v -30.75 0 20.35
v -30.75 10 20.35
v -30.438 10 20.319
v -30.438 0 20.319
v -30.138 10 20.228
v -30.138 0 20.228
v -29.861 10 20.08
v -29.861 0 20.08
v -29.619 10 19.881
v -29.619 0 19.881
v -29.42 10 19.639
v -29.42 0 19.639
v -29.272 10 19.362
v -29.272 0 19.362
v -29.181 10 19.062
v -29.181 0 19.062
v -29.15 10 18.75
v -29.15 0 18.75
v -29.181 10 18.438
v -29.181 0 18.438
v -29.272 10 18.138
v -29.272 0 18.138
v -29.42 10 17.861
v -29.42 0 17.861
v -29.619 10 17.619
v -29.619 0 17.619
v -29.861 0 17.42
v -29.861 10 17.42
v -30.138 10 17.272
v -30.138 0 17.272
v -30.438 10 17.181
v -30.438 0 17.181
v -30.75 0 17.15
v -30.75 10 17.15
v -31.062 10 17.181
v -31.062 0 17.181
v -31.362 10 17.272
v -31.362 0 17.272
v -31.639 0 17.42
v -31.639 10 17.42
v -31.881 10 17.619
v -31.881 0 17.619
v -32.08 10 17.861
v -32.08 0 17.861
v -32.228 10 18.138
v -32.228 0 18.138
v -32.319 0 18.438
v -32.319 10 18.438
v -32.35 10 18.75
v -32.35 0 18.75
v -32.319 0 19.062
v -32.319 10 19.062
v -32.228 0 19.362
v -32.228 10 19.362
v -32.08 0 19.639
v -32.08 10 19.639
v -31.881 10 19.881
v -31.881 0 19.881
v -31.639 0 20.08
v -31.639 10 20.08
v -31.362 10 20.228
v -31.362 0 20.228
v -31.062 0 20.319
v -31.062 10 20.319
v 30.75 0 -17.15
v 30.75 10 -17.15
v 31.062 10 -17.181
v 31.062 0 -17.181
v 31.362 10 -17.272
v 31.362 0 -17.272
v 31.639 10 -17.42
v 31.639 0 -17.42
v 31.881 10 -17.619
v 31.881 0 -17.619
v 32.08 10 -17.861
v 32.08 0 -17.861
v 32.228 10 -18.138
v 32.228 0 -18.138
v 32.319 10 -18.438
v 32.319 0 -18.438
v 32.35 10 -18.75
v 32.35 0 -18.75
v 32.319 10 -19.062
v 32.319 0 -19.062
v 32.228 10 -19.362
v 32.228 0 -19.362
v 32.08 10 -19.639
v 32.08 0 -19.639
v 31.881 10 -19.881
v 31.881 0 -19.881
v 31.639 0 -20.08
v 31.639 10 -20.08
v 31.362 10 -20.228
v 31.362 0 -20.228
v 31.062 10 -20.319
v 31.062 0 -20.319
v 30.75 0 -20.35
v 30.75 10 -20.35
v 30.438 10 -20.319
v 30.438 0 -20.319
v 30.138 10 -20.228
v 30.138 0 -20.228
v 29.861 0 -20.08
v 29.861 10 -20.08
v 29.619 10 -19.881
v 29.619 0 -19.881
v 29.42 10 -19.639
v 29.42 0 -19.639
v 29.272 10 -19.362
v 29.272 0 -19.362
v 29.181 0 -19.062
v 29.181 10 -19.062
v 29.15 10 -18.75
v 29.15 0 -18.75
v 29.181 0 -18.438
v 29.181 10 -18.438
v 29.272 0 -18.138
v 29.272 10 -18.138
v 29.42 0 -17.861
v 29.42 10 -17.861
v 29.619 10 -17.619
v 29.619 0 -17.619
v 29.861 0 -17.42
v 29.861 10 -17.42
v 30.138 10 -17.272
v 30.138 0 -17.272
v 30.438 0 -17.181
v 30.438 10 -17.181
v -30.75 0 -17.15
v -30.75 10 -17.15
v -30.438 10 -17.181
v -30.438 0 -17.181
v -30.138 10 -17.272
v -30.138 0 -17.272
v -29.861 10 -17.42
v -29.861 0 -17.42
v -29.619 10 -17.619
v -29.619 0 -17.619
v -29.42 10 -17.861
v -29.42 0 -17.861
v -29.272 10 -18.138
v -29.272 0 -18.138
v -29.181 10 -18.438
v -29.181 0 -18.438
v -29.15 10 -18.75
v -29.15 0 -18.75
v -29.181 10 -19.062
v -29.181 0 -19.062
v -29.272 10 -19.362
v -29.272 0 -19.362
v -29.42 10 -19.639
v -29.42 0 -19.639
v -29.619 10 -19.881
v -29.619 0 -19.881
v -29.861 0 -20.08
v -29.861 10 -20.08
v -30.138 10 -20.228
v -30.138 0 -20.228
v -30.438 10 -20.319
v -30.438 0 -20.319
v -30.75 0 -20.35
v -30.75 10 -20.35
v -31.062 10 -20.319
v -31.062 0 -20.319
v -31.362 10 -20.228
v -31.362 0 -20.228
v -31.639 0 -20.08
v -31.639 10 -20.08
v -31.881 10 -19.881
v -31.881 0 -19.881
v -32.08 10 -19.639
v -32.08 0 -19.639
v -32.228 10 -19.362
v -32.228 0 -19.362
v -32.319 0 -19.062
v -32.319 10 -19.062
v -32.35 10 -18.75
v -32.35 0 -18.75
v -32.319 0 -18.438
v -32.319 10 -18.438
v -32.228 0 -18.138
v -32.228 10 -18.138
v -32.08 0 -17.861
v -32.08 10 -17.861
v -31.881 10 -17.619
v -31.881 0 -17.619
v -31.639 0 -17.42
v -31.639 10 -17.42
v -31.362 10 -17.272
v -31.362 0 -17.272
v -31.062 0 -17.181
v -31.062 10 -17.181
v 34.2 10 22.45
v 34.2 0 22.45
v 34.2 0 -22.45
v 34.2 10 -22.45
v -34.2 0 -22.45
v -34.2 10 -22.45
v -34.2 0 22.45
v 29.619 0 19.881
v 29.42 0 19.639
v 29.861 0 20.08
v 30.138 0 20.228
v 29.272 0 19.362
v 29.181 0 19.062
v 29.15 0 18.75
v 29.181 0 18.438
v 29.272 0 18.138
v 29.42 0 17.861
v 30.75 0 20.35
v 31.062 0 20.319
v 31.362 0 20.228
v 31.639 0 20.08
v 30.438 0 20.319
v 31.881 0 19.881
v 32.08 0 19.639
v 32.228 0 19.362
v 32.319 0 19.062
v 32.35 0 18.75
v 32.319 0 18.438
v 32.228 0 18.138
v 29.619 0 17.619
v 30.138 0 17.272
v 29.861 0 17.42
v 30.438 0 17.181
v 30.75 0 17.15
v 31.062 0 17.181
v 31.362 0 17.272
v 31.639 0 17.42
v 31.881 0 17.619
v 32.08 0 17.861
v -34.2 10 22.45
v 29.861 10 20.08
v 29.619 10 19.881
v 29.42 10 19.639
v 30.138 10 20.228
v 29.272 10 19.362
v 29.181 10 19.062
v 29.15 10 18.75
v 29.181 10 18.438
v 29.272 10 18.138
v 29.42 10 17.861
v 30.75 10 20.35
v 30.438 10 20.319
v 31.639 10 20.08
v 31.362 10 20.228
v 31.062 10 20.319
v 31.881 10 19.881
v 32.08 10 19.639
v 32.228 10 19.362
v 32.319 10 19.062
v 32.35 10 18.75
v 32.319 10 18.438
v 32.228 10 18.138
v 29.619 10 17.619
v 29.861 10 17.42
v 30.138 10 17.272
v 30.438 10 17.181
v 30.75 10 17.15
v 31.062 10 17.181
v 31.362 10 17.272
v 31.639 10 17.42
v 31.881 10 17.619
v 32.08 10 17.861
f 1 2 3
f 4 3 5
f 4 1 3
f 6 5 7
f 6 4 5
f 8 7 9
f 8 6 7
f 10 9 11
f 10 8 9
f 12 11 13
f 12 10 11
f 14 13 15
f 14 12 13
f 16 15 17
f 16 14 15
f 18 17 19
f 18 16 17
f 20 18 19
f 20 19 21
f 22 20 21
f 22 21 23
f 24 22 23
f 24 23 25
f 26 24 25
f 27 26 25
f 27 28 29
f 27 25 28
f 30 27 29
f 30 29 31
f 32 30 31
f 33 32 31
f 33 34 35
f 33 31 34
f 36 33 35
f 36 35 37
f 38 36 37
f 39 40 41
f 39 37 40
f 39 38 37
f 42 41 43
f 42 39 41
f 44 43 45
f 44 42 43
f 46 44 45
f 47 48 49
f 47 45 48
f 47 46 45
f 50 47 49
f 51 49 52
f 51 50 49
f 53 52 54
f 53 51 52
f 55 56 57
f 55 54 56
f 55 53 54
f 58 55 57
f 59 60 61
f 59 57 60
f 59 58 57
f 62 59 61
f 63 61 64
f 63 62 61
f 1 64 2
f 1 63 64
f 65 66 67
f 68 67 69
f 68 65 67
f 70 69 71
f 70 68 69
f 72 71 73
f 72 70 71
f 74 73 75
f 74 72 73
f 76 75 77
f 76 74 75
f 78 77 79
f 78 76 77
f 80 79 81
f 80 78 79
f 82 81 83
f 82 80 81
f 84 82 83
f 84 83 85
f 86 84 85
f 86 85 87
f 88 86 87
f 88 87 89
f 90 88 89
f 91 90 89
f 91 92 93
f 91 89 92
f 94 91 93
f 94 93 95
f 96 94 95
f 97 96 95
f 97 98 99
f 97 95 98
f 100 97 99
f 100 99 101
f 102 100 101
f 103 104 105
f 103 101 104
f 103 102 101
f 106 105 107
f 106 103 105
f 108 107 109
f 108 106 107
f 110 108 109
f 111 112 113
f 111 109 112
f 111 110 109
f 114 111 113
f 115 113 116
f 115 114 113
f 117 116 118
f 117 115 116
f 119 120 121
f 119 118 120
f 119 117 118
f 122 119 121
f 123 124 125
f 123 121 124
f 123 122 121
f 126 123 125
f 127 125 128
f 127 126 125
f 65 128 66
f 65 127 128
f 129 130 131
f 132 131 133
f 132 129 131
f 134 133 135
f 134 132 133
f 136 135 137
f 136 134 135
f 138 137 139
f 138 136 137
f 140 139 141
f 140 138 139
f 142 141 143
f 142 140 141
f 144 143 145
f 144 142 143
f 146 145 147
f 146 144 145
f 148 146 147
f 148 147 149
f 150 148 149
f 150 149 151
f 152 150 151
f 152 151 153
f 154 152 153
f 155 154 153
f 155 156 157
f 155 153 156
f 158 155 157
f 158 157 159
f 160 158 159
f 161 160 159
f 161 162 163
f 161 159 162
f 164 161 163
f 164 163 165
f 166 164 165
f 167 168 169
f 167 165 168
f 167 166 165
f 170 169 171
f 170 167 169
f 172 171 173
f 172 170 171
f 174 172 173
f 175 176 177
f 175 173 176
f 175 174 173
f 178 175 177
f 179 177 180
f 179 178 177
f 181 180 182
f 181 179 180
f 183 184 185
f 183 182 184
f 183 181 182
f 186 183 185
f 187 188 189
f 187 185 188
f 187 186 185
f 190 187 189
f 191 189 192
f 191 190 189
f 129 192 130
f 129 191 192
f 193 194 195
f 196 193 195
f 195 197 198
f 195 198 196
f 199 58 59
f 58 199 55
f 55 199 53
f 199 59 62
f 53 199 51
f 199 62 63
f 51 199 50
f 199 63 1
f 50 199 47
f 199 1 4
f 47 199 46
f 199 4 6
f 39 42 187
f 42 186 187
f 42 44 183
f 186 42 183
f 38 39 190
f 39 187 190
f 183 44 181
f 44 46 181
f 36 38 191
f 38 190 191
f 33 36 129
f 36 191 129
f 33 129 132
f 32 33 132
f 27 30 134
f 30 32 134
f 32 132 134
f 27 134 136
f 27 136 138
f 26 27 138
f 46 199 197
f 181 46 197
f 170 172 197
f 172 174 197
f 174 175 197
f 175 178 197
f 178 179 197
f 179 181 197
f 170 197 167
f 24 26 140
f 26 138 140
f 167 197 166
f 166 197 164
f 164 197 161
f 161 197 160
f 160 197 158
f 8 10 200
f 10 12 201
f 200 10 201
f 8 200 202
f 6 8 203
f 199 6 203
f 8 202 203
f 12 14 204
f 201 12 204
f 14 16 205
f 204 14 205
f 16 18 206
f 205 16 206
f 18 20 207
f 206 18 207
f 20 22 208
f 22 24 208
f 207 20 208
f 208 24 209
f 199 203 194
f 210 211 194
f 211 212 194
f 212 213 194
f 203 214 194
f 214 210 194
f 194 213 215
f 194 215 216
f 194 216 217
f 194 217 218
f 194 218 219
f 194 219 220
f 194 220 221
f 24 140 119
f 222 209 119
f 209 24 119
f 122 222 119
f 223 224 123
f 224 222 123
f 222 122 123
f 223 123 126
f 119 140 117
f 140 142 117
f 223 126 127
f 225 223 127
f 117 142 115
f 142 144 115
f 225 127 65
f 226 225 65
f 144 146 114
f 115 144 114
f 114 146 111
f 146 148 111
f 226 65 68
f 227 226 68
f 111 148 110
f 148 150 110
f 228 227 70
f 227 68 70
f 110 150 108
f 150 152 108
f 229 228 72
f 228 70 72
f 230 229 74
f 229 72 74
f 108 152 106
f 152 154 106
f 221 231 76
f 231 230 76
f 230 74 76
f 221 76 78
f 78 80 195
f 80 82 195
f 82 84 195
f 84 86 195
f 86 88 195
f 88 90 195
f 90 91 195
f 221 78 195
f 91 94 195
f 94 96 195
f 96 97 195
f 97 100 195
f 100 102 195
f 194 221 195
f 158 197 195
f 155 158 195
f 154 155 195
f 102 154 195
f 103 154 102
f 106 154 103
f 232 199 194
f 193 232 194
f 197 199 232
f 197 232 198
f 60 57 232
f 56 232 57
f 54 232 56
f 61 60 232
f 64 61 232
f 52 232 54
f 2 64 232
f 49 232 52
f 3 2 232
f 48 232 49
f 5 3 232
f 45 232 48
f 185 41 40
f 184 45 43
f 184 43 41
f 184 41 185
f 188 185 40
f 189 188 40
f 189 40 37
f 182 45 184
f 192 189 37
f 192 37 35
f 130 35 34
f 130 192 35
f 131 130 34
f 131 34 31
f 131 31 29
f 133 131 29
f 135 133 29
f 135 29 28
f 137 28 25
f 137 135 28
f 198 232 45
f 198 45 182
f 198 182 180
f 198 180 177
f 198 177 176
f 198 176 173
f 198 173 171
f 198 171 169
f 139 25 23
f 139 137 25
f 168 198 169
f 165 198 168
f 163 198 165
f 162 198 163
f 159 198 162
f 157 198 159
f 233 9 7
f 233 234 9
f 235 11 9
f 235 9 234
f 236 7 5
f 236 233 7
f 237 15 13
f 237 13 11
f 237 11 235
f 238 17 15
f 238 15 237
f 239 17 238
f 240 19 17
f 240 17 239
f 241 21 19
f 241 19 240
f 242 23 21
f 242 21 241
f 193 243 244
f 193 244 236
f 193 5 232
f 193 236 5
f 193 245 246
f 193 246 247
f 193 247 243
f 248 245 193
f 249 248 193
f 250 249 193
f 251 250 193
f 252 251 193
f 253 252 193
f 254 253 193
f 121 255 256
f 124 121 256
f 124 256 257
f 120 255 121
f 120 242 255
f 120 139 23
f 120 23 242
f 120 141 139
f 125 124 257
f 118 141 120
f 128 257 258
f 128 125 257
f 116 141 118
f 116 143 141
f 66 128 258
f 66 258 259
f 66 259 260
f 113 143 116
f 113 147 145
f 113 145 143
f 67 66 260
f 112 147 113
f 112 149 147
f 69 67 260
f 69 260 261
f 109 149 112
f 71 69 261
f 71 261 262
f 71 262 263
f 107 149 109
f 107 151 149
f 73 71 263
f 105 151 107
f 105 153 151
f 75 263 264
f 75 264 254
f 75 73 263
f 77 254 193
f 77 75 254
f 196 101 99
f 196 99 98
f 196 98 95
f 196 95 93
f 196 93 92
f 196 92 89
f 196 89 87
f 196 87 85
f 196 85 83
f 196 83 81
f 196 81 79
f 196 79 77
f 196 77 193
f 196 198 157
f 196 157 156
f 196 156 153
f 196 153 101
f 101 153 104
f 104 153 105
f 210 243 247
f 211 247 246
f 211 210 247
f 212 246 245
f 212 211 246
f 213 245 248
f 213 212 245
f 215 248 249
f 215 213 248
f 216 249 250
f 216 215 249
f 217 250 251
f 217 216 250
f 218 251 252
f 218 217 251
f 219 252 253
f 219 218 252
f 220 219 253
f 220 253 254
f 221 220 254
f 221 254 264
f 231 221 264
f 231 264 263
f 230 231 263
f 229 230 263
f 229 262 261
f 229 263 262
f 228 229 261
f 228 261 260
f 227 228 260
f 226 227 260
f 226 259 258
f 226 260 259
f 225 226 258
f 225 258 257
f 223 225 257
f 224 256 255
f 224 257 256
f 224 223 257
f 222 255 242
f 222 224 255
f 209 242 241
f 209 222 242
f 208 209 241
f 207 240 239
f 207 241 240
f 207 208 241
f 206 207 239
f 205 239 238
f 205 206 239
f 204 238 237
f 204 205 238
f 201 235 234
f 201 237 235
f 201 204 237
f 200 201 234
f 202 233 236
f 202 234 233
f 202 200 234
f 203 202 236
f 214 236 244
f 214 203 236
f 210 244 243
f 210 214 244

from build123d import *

# Parameters (mm, degrees)
SKETCH1_W           = 68.4
SKETCH1_H           = 44.9
BOSS_EXTRUDE1_DEPTH = 10
CUT_EXTRUDE1_REACH  = 44.115
SKETCH2_R           = 1.6


with BuildPart() as part:
    # Sketch1 → Boss-Extrude1 (new body)
    with BuildSketch(Plane(origin=(0, 0, 0), x_dir=(1, 0, 0), z_dir=(0, 1, 0))):
        Rectangle(SKETCH1_W, SKETCH1_H)
    extrude(amount=BOSS_EXTRUDE1_DEPTH)

    # Sketch2 → Cut-Extrude1 (cut, up to next)
    with BuildSketch(Plane(origin=(0, 0, 0), x_dir=(1, 0, 0), z_dir=(0, 1, 0)), mode=Mode.PRIVATE) as cut_extrude1_sk1:
        with Locations(Location((30.75, 18.75, 0), (0, 0, 270))):
            Circle(SKETCH2_R)
    cut_extrude1_tool1 = extrude(cut_extrude1_sk1.sketch, amount=CUT_EXTRUDE1_REACH, mode=Mode.PRIVATE) & part.part
    # Sketch2 → Cut-Extrude1 (cut, up to next)
    with BuildSketch(Plane(origin=(0, 0, 0), x_dir=(1, 0, 0), z_dir=(0, 1, 0)), mode=Mode.PRIVATE) as cut_extrude1_sk2:
        with Locations(Location((30.75, -18.75, 0), (0, 0, 270))):
            Circle(SKETCH2_R)
    cut_extrude1_tool2 = extrude(cut_extrude1_sk2.sketch, amount=CUT_EXTRUDE1_REACH, mode=Mode.PRIVATE) & part.part
    # Sketch2 → Cut-Extrude1 (cut, up to next)
    with BuildSketch(Plane(origin=(0, 0, 0), x_dir=(1, 0, 0), z_dir=(0, 1, 0)), mode=Mode.PRIVATE) as cut_extrude1_sk3:
        with Locations(Location((-30.75, -18.75, 0), (0, 0, 270))):
            Circle(SKETCH2_R)
    cut_extrude1_tool3 = extrude(cut_extrude1_sk3.sketch, amount=CUT_EXTRUDE1_REACH, mode=Mode.PRIVATE) & part.part
    # Sketch2 → Cut-Extrude1 (cut, up to next)
    with BuildSketch(Plane(origin=(0, 0, 0), x_dir=(1, 0, 0), z_dir=(0, 1, 0)), mode=Mode.PRIVATE) as cut_extrude1_sk4:
        with Locations(Location((-30.75, 18.75, 0), (0, 0, 270))):
            Circle(SKETCH2_R)
    cut_extrude1_tool4 = extrude(cut_extrude1_sk4.sketch, amount=CUT_EXTRUDE1_REACH, mode=Mode.PRIVATE) & part.part
    add(cut_extrude1_tool1.solids().sort_by_distance((30.75, 0, -18.75))[0], mode=Mode.SUBTRACT)
    add(cut_extrude1_tool2.solids().sort_by_distance((30.75, 0, 18.75))[0], mode=Mode.SUBTRACT)
    add(cut_extrude1_tool3.solids().sort_by_distance((-30.75, 0, 18.75))[0], mode=Mode.SUBTRACT)
    add(cut_extrude1_tool4.solids().sort_by_distance((-30.75, 0, -18.75))[0], mode=Mode.SUBTRACT)


solid = part.part
